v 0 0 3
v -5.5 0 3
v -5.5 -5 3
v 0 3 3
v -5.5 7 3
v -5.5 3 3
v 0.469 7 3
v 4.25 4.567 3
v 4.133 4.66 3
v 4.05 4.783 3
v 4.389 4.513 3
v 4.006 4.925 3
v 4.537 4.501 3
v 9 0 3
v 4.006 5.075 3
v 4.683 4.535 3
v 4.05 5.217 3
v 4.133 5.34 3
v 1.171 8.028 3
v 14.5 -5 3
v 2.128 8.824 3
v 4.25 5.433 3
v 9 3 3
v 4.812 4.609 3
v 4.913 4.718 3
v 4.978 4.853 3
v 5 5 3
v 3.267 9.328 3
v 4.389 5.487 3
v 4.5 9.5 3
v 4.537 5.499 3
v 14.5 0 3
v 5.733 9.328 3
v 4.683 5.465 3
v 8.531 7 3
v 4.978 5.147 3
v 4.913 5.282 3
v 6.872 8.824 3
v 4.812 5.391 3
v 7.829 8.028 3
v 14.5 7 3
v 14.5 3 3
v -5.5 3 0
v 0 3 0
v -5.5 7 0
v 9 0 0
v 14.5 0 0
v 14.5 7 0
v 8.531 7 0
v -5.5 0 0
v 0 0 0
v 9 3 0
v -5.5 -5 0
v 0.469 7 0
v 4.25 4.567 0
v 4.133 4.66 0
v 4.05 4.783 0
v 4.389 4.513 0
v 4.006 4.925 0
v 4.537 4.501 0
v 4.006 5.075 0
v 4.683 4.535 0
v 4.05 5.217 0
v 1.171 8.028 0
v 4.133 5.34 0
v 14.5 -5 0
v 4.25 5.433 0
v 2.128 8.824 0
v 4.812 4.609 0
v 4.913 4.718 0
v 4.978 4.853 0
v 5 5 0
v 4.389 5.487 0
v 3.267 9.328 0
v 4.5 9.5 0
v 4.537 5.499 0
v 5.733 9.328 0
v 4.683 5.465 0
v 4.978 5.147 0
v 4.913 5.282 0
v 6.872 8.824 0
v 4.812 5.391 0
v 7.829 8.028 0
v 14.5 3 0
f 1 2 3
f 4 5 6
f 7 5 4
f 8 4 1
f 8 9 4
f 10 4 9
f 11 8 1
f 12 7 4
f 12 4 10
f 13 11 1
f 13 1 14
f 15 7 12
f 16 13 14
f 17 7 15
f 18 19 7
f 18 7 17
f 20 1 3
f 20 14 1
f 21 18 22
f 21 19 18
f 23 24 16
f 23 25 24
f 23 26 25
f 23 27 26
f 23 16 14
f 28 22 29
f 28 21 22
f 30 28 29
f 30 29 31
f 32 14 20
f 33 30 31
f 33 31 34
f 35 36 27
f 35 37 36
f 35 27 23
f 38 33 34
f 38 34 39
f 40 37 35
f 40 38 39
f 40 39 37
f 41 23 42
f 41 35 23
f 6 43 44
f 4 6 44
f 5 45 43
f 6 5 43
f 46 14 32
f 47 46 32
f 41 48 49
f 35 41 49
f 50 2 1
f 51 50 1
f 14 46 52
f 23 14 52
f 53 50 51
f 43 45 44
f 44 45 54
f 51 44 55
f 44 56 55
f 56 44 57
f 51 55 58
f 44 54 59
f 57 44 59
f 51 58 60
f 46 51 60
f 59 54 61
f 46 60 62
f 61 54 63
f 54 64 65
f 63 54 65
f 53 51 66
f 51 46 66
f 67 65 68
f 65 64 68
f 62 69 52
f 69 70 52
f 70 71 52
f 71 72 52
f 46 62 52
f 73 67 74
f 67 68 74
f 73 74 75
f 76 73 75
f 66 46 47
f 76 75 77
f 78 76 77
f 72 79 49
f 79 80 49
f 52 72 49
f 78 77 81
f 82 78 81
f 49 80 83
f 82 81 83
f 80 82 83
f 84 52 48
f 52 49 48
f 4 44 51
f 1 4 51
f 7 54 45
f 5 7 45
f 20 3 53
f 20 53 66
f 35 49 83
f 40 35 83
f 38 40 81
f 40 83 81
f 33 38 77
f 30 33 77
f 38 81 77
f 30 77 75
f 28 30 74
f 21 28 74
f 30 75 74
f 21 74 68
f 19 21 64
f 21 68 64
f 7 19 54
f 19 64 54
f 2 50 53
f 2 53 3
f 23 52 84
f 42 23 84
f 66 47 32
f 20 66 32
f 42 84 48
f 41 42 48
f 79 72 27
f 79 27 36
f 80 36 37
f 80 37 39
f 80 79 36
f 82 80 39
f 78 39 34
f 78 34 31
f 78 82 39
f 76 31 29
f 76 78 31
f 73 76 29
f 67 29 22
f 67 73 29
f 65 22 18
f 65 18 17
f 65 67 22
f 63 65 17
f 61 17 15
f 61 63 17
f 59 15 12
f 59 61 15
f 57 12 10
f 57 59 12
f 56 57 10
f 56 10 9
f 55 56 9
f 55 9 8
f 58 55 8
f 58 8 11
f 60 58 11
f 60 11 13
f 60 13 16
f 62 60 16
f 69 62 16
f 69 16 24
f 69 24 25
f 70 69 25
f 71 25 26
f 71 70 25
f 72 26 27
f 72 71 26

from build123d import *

# Parameters (mm, degrees)
SKETCH1_R           = 0.5
BOSS_EXTRUDE1_DEPTH = 3
SKETCH2_W           = 20
SKETCH2_H           = 3
BOSS_EXTRUDE2_DEPTH = 5


with BuildPart() as part:
    # Sketch1 → Boss-Extrude1 (new body)
    with BuildSketch(Plane.XY):
        with BuildLine():
            Line((0.468871097, 6.999999884), (-5.5, 6.999999884))
            Line((-5.5, 6.999999884), (-5.5, 3))
            Line((-5.5, 3), (0, 3))
            Line((0, 3), (0, 0))
            Line((0, 0), (9, 0))
            Line((9, 0), (9, 3))
            Line((9, 3), (14.5, 3))
            Line((14.5, 3), (14.5, 6.999999884))
            Line((14.5, 6.999999884), (8.531128903, 6.999999884))
            ThreePointArc((8.531128903, 6.999999884), (4.5, 9.499999942), (0.468871097, 6.999999884))
        make_face()
        with Locations((4.5, 4.999999942)):
            Circle(SKETCH1_R, mode=Mode.SUBTRACT)
    extrude(amount=BOSS_EXTRUDE1_DEPTH)

    # Sketch2 → Boss-Extrude2 (add)
    with BuildSketch(Plane.XZ):
        with Locations((4.5, 1.5)):
            Rectangle(SKETCH2_W, SKETCH2_H)
    extrude(amount=BOSS_EXTRUDE2_DEPTH)


solid = part.part
